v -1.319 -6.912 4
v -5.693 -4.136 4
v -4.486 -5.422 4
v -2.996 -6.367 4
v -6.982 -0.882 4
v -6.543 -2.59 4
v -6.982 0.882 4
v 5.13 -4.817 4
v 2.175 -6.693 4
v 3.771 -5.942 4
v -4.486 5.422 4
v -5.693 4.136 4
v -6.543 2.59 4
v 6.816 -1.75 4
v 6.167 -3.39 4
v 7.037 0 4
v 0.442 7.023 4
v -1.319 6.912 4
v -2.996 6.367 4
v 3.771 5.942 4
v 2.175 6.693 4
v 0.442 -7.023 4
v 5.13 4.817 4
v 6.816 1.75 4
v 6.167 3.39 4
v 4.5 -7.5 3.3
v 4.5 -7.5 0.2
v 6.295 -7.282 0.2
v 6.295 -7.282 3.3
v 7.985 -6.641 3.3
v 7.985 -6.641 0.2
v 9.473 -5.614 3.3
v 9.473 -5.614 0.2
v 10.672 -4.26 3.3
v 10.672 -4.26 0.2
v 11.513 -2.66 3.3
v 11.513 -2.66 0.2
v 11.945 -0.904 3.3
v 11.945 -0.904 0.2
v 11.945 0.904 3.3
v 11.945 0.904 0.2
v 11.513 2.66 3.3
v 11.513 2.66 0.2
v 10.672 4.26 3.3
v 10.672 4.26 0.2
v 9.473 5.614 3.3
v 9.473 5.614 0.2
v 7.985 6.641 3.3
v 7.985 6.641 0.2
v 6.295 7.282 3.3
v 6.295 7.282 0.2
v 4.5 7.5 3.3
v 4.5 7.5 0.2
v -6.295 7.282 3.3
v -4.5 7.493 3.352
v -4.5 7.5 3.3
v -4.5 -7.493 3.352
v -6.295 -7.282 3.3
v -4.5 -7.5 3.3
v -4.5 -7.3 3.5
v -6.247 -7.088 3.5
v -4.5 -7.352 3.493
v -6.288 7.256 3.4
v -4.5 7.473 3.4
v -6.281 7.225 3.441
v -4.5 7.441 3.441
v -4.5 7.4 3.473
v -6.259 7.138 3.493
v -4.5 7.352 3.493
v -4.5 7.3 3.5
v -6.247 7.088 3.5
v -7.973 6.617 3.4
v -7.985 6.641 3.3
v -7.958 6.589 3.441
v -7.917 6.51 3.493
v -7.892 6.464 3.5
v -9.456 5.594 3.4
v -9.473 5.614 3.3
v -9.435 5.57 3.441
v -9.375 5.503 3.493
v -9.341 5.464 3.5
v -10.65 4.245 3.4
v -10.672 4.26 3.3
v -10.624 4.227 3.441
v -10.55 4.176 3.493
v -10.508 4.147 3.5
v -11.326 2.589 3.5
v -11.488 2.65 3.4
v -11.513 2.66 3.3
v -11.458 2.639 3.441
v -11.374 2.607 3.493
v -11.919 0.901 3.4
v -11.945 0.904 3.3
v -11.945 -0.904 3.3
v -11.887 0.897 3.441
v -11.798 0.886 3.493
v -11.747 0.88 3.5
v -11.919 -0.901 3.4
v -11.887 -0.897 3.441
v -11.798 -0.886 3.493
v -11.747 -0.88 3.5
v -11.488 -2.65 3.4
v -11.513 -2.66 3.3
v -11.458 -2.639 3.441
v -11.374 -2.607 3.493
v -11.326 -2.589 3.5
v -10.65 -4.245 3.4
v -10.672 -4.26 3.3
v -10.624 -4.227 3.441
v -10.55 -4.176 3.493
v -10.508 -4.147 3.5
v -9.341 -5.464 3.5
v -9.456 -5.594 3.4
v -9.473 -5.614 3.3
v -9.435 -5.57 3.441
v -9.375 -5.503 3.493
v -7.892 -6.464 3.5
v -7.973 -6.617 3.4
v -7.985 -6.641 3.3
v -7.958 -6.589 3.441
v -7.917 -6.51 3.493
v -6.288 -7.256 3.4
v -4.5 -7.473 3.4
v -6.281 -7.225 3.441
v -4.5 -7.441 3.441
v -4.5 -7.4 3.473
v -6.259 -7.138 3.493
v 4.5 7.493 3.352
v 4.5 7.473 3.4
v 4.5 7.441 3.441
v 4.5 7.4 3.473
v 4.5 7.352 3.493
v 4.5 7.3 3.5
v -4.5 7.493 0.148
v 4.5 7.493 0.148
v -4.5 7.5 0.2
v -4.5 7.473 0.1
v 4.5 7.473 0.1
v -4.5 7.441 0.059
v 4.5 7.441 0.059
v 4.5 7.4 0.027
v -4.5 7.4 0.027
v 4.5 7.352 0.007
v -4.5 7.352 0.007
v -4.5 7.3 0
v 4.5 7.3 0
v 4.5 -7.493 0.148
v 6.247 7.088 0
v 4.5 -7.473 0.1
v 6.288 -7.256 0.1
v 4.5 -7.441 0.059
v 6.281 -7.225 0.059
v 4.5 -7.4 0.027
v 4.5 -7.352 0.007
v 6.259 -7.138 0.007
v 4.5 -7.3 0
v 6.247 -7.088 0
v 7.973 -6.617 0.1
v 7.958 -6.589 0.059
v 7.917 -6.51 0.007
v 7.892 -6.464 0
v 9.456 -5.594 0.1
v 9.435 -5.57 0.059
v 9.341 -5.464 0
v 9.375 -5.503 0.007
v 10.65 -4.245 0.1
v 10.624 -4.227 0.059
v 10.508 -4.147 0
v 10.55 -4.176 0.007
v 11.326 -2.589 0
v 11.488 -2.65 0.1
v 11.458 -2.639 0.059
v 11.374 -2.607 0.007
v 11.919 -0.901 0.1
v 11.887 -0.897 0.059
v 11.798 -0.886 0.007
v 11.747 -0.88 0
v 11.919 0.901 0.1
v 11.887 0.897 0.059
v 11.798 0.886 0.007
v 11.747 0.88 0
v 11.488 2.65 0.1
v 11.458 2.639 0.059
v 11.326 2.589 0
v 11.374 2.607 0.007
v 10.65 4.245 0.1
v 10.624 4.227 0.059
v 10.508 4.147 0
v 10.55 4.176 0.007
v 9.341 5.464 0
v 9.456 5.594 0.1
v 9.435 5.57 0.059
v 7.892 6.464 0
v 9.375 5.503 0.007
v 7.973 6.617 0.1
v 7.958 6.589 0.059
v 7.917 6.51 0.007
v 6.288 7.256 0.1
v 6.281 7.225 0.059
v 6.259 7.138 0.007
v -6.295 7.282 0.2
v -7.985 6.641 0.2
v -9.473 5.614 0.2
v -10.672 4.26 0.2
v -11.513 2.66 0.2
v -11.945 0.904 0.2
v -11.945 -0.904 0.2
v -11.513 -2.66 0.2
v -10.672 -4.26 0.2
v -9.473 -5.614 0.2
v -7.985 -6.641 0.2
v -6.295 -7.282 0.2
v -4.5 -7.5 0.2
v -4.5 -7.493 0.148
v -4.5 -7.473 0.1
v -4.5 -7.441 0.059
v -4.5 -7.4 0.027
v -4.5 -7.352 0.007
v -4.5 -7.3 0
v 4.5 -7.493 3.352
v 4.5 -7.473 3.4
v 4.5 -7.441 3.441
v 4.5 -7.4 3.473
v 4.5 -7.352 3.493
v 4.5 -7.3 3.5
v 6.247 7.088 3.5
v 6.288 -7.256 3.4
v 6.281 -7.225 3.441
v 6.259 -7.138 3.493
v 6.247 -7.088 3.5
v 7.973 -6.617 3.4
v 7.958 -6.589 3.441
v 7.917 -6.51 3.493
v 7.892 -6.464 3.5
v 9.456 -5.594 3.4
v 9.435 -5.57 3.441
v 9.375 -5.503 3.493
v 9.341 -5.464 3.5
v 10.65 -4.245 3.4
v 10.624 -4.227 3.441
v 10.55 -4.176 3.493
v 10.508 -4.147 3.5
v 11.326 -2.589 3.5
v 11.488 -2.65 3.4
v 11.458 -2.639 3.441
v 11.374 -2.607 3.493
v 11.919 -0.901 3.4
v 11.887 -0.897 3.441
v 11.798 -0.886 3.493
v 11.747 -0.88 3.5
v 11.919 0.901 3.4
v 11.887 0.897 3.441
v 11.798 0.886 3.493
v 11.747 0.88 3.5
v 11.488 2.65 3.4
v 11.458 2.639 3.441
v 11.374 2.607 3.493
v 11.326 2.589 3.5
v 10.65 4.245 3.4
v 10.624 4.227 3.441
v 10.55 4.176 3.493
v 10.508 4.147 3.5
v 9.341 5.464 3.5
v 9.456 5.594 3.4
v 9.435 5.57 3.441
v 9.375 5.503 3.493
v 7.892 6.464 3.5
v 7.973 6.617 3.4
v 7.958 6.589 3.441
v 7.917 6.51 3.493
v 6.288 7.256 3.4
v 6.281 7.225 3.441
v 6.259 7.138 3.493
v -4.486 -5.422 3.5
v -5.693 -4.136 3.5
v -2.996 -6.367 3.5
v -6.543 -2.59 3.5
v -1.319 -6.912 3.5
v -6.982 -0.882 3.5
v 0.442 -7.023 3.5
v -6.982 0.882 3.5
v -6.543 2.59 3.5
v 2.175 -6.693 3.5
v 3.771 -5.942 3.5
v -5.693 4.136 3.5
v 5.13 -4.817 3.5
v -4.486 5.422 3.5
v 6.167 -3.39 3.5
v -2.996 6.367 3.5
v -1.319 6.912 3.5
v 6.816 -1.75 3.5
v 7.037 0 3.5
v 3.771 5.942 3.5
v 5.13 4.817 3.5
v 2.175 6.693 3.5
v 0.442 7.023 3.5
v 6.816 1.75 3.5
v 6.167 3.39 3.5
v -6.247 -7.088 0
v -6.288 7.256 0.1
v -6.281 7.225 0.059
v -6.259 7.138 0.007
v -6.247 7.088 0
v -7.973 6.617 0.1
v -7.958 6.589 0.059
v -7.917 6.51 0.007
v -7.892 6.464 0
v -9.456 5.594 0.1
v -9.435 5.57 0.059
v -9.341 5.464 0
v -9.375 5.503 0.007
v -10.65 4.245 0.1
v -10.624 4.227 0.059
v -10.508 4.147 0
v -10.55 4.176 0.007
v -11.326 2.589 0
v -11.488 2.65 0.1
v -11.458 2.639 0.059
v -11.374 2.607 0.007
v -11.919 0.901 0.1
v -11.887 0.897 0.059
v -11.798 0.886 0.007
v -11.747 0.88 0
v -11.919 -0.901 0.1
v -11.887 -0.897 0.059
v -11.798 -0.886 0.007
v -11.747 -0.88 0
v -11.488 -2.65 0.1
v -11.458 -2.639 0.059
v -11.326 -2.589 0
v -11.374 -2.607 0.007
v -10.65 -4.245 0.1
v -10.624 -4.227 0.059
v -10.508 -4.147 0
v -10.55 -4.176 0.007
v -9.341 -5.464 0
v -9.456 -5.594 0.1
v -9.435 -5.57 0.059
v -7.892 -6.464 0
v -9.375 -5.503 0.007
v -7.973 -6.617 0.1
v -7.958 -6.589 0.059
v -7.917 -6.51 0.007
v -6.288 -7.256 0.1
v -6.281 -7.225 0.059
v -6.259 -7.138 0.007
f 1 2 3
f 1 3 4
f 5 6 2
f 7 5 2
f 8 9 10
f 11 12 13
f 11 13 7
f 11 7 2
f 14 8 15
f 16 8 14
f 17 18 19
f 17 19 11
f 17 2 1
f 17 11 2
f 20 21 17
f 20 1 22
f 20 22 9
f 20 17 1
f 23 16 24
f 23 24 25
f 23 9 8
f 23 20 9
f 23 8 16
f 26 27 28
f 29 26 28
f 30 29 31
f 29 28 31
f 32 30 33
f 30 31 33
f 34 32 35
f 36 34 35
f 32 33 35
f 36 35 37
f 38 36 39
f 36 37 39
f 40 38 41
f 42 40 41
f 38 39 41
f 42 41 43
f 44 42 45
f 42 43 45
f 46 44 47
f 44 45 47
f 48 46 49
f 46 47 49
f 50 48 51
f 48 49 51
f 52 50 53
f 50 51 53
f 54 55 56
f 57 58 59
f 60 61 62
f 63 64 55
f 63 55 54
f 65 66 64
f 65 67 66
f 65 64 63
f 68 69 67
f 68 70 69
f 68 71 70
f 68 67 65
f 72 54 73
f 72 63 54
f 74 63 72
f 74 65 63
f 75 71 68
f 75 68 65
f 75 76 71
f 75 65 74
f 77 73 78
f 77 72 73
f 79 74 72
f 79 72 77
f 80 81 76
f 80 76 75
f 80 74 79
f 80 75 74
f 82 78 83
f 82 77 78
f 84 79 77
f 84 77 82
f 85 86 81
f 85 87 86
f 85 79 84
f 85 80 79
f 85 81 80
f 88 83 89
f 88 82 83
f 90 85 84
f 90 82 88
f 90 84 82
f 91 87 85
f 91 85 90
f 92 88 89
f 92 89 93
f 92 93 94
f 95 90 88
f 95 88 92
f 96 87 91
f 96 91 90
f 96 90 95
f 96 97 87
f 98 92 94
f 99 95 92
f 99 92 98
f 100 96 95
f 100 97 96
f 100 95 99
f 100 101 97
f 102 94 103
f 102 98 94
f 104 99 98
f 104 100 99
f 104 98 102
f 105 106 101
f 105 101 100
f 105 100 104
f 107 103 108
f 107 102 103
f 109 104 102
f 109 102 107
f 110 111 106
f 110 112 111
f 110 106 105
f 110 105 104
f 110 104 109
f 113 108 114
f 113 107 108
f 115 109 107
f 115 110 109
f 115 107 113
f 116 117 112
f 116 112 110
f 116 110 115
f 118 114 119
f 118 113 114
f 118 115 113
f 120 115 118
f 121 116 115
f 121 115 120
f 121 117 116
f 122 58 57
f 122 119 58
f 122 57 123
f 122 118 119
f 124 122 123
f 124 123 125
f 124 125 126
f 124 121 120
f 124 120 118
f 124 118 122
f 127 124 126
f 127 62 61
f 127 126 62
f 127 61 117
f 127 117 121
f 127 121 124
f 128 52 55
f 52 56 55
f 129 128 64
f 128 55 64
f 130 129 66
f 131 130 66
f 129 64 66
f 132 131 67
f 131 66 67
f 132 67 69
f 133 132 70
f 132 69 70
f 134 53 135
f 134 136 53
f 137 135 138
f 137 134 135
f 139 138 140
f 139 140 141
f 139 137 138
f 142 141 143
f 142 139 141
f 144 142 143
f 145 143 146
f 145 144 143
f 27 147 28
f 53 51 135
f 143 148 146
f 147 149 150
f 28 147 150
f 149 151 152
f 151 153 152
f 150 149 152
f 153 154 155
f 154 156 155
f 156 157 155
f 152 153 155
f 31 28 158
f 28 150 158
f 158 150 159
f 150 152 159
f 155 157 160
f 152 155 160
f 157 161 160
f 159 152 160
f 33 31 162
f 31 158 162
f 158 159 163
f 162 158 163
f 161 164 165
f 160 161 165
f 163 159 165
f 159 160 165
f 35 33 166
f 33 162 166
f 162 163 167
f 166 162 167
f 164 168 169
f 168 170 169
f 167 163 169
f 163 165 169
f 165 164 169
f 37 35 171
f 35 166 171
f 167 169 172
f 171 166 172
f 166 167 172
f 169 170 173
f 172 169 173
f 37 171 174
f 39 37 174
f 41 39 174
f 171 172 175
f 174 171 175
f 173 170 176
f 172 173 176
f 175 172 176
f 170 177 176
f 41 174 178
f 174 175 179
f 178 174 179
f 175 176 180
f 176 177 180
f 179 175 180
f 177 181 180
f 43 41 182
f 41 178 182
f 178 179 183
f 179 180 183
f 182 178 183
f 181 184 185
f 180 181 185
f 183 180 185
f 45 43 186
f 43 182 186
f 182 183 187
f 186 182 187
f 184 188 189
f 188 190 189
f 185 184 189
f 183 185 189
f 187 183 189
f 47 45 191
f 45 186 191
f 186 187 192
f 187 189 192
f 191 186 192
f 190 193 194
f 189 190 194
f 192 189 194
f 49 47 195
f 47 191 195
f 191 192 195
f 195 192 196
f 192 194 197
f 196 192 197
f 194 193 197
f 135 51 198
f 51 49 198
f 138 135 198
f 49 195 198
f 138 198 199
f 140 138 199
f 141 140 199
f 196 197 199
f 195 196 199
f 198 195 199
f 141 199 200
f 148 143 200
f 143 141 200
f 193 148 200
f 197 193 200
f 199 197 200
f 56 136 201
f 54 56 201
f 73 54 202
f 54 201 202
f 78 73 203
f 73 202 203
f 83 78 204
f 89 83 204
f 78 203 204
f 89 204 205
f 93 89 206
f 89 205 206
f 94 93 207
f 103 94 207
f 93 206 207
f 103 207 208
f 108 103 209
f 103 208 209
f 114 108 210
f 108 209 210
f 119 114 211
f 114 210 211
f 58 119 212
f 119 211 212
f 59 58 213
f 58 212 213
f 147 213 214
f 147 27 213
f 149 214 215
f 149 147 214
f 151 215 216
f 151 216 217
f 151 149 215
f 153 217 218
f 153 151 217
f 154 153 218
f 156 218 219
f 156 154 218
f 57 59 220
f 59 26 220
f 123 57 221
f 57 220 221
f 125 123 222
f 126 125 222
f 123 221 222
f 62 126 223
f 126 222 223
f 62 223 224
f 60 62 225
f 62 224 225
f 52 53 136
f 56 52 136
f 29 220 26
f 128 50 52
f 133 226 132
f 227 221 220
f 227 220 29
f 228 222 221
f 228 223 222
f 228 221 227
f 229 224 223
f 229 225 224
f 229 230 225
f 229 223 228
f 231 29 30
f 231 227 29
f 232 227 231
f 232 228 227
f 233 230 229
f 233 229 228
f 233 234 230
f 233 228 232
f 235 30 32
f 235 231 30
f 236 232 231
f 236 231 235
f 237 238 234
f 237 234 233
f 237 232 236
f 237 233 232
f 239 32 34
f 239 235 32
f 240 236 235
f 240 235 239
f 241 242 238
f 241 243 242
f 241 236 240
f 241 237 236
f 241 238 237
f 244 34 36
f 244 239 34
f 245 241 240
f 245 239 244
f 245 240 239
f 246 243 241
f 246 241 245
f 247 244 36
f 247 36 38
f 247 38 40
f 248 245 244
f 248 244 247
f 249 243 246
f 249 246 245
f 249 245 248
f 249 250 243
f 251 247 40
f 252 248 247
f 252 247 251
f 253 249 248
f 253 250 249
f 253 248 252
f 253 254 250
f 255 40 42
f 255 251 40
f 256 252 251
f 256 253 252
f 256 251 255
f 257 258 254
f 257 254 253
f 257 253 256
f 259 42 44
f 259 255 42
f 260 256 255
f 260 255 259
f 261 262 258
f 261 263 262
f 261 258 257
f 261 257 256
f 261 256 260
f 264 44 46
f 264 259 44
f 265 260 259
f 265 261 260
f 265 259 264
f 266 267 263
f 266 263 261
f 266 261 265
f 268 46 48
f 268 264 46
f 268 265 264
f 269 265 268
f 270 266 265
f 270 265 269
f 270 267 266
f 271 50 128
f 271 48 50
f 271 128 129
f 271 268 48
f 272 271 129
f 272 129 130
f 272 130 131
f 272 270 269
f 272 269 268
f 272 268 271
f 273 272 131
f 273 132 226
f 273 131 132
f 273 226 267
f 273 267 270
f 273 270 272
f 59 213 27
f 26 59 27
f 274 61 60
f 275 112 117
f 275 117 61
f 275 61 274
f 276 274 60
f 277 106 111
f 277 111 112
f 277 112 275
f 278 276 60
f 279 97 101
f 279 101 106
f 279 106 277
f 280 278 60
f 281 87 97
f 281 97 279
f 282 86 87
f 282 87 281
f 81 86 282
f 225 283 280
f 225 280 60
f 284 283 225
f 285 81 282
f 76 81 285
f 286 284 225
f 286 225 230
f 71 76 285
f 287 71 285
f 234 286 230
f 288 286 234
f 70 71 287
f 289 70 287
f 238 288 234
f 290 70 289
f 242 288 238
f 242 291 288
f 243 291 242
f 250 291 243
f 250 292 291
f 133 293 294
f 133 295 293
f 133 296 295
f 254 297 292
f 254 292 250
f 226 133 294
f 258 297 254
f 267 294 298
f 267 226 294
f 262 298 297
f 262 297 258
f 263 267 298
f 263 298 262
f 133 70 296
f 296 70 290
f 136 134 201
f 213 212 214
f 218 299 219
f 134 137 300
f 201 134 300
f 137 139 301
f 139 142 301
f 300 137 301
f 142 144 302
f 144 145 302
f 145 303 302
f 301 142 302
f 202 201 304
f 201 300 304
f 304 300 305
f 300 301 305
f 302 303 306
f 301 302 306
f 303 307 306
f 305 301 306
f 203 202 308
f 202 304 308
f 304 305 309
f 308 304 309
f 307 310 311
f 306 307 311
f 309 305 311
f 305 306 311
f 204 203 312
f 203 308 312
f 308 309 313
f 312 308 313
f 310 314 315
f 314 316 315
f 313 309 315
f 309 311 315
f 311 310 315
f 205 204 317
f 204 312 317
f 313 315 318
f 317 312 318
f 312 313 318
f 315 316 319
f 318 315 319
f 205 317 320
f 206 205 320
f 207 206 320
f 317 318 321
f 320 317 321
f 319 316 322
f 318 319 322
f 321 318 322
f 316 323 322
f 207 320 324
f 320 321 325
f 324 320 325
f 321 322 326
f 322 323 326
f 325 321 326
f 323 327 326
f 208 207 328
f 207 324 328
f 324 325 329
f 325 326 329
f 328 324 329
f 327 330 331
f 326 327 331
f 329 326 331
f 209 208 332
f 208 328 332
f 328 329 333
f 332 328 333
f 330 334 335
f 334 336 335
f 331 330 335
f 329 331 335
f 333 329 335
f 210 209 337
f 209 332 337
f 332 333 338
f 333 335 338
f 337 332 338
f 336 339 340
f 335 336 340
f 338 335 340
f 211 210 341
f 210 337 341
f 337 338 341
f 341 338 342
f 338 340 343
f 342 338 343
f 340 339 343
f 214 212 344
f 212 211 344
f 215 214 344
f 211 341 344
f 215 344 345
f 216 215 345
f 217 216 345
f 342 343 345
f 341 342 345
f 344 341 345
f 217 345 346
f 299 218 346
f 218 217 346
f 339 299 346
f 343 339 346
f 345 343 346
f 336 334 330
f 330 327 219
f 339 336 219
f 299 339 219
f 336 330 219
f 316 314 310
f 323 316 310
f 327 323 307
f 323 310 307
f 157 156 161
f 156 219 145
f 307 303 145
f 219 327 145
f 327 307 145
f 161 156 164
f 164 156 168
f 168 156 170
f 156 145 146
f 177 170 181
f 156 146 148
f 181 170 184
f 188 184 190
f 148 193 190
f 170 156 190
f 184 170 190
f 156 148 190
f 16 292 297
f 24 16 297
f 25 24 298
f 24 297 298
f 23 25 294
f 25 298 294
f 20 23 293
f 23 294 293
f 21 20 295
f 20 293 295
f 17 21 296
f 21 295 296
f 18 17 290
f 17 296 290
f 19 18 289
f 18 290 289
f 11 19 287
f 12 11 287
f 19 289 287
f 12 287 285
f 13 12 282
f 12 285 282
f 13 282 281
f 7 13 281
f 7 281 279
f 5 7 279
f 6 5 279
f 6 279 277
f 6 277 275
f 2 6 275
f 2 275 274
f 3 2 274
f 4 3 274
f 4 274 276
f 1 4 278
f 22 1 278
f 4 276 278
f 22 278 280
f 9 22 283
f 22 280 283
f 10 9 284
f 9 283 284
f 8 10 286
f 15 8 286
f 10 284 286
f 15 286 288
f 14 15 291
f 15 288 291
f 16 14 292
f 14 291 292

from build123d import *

# Parameters (mm, degrees)
BOSS_EXTRUDE1_DEPTH = 3.5
SKETCH2_R           = 7.036998645
BOSS_EXTRUDE2_DEPTH = 0.5
FILLET1_R           = 0.2


with BuildPart() as part:
    # Sketch1 → Boss-Extrude1 (new body)
    with BuildSketch(Plane.XY):
        with BuildLine():
            Line((-4.5, -7.5), (4.5, -7.5))
            ThreePointArc((4.5, -7.5), (12, 0), (4.5, 7.5))
            Line((4.5, 7.5), (-4.5, 7.5))
            ThreePointArc((-4.5, 7.5), (-12, 0), (-4.5, -7.5))
        make_face()
    extrude(amount=BOSS_EXTRUDE1_DEPTH)

    # Sketch2 → Boss-Extrude2 (add)
    with BuildSketch(Plane.XY.offset(3.5)):
        Circle(SKETCH2_R)
    extrude(amount=BOSS_EXTRUDE2_DEPTH)

    # Fillet1
    fillet1_edges = [part.edges().sort_by_distance(p)[0] for p in [
        (-12, 0, 3.5),
        (0, -7.5, 3.5),
        (12, 0, 3.5),
        (0, -7.5, 0),
        (-12, 0, 0),
        (0, 7.5, 0),
        (12, 0, 0),
        (0, 7.5, 3.5),
    ]]
    fillet(fillet1_edges, radius=FILLET1_R)


solid = part.part
